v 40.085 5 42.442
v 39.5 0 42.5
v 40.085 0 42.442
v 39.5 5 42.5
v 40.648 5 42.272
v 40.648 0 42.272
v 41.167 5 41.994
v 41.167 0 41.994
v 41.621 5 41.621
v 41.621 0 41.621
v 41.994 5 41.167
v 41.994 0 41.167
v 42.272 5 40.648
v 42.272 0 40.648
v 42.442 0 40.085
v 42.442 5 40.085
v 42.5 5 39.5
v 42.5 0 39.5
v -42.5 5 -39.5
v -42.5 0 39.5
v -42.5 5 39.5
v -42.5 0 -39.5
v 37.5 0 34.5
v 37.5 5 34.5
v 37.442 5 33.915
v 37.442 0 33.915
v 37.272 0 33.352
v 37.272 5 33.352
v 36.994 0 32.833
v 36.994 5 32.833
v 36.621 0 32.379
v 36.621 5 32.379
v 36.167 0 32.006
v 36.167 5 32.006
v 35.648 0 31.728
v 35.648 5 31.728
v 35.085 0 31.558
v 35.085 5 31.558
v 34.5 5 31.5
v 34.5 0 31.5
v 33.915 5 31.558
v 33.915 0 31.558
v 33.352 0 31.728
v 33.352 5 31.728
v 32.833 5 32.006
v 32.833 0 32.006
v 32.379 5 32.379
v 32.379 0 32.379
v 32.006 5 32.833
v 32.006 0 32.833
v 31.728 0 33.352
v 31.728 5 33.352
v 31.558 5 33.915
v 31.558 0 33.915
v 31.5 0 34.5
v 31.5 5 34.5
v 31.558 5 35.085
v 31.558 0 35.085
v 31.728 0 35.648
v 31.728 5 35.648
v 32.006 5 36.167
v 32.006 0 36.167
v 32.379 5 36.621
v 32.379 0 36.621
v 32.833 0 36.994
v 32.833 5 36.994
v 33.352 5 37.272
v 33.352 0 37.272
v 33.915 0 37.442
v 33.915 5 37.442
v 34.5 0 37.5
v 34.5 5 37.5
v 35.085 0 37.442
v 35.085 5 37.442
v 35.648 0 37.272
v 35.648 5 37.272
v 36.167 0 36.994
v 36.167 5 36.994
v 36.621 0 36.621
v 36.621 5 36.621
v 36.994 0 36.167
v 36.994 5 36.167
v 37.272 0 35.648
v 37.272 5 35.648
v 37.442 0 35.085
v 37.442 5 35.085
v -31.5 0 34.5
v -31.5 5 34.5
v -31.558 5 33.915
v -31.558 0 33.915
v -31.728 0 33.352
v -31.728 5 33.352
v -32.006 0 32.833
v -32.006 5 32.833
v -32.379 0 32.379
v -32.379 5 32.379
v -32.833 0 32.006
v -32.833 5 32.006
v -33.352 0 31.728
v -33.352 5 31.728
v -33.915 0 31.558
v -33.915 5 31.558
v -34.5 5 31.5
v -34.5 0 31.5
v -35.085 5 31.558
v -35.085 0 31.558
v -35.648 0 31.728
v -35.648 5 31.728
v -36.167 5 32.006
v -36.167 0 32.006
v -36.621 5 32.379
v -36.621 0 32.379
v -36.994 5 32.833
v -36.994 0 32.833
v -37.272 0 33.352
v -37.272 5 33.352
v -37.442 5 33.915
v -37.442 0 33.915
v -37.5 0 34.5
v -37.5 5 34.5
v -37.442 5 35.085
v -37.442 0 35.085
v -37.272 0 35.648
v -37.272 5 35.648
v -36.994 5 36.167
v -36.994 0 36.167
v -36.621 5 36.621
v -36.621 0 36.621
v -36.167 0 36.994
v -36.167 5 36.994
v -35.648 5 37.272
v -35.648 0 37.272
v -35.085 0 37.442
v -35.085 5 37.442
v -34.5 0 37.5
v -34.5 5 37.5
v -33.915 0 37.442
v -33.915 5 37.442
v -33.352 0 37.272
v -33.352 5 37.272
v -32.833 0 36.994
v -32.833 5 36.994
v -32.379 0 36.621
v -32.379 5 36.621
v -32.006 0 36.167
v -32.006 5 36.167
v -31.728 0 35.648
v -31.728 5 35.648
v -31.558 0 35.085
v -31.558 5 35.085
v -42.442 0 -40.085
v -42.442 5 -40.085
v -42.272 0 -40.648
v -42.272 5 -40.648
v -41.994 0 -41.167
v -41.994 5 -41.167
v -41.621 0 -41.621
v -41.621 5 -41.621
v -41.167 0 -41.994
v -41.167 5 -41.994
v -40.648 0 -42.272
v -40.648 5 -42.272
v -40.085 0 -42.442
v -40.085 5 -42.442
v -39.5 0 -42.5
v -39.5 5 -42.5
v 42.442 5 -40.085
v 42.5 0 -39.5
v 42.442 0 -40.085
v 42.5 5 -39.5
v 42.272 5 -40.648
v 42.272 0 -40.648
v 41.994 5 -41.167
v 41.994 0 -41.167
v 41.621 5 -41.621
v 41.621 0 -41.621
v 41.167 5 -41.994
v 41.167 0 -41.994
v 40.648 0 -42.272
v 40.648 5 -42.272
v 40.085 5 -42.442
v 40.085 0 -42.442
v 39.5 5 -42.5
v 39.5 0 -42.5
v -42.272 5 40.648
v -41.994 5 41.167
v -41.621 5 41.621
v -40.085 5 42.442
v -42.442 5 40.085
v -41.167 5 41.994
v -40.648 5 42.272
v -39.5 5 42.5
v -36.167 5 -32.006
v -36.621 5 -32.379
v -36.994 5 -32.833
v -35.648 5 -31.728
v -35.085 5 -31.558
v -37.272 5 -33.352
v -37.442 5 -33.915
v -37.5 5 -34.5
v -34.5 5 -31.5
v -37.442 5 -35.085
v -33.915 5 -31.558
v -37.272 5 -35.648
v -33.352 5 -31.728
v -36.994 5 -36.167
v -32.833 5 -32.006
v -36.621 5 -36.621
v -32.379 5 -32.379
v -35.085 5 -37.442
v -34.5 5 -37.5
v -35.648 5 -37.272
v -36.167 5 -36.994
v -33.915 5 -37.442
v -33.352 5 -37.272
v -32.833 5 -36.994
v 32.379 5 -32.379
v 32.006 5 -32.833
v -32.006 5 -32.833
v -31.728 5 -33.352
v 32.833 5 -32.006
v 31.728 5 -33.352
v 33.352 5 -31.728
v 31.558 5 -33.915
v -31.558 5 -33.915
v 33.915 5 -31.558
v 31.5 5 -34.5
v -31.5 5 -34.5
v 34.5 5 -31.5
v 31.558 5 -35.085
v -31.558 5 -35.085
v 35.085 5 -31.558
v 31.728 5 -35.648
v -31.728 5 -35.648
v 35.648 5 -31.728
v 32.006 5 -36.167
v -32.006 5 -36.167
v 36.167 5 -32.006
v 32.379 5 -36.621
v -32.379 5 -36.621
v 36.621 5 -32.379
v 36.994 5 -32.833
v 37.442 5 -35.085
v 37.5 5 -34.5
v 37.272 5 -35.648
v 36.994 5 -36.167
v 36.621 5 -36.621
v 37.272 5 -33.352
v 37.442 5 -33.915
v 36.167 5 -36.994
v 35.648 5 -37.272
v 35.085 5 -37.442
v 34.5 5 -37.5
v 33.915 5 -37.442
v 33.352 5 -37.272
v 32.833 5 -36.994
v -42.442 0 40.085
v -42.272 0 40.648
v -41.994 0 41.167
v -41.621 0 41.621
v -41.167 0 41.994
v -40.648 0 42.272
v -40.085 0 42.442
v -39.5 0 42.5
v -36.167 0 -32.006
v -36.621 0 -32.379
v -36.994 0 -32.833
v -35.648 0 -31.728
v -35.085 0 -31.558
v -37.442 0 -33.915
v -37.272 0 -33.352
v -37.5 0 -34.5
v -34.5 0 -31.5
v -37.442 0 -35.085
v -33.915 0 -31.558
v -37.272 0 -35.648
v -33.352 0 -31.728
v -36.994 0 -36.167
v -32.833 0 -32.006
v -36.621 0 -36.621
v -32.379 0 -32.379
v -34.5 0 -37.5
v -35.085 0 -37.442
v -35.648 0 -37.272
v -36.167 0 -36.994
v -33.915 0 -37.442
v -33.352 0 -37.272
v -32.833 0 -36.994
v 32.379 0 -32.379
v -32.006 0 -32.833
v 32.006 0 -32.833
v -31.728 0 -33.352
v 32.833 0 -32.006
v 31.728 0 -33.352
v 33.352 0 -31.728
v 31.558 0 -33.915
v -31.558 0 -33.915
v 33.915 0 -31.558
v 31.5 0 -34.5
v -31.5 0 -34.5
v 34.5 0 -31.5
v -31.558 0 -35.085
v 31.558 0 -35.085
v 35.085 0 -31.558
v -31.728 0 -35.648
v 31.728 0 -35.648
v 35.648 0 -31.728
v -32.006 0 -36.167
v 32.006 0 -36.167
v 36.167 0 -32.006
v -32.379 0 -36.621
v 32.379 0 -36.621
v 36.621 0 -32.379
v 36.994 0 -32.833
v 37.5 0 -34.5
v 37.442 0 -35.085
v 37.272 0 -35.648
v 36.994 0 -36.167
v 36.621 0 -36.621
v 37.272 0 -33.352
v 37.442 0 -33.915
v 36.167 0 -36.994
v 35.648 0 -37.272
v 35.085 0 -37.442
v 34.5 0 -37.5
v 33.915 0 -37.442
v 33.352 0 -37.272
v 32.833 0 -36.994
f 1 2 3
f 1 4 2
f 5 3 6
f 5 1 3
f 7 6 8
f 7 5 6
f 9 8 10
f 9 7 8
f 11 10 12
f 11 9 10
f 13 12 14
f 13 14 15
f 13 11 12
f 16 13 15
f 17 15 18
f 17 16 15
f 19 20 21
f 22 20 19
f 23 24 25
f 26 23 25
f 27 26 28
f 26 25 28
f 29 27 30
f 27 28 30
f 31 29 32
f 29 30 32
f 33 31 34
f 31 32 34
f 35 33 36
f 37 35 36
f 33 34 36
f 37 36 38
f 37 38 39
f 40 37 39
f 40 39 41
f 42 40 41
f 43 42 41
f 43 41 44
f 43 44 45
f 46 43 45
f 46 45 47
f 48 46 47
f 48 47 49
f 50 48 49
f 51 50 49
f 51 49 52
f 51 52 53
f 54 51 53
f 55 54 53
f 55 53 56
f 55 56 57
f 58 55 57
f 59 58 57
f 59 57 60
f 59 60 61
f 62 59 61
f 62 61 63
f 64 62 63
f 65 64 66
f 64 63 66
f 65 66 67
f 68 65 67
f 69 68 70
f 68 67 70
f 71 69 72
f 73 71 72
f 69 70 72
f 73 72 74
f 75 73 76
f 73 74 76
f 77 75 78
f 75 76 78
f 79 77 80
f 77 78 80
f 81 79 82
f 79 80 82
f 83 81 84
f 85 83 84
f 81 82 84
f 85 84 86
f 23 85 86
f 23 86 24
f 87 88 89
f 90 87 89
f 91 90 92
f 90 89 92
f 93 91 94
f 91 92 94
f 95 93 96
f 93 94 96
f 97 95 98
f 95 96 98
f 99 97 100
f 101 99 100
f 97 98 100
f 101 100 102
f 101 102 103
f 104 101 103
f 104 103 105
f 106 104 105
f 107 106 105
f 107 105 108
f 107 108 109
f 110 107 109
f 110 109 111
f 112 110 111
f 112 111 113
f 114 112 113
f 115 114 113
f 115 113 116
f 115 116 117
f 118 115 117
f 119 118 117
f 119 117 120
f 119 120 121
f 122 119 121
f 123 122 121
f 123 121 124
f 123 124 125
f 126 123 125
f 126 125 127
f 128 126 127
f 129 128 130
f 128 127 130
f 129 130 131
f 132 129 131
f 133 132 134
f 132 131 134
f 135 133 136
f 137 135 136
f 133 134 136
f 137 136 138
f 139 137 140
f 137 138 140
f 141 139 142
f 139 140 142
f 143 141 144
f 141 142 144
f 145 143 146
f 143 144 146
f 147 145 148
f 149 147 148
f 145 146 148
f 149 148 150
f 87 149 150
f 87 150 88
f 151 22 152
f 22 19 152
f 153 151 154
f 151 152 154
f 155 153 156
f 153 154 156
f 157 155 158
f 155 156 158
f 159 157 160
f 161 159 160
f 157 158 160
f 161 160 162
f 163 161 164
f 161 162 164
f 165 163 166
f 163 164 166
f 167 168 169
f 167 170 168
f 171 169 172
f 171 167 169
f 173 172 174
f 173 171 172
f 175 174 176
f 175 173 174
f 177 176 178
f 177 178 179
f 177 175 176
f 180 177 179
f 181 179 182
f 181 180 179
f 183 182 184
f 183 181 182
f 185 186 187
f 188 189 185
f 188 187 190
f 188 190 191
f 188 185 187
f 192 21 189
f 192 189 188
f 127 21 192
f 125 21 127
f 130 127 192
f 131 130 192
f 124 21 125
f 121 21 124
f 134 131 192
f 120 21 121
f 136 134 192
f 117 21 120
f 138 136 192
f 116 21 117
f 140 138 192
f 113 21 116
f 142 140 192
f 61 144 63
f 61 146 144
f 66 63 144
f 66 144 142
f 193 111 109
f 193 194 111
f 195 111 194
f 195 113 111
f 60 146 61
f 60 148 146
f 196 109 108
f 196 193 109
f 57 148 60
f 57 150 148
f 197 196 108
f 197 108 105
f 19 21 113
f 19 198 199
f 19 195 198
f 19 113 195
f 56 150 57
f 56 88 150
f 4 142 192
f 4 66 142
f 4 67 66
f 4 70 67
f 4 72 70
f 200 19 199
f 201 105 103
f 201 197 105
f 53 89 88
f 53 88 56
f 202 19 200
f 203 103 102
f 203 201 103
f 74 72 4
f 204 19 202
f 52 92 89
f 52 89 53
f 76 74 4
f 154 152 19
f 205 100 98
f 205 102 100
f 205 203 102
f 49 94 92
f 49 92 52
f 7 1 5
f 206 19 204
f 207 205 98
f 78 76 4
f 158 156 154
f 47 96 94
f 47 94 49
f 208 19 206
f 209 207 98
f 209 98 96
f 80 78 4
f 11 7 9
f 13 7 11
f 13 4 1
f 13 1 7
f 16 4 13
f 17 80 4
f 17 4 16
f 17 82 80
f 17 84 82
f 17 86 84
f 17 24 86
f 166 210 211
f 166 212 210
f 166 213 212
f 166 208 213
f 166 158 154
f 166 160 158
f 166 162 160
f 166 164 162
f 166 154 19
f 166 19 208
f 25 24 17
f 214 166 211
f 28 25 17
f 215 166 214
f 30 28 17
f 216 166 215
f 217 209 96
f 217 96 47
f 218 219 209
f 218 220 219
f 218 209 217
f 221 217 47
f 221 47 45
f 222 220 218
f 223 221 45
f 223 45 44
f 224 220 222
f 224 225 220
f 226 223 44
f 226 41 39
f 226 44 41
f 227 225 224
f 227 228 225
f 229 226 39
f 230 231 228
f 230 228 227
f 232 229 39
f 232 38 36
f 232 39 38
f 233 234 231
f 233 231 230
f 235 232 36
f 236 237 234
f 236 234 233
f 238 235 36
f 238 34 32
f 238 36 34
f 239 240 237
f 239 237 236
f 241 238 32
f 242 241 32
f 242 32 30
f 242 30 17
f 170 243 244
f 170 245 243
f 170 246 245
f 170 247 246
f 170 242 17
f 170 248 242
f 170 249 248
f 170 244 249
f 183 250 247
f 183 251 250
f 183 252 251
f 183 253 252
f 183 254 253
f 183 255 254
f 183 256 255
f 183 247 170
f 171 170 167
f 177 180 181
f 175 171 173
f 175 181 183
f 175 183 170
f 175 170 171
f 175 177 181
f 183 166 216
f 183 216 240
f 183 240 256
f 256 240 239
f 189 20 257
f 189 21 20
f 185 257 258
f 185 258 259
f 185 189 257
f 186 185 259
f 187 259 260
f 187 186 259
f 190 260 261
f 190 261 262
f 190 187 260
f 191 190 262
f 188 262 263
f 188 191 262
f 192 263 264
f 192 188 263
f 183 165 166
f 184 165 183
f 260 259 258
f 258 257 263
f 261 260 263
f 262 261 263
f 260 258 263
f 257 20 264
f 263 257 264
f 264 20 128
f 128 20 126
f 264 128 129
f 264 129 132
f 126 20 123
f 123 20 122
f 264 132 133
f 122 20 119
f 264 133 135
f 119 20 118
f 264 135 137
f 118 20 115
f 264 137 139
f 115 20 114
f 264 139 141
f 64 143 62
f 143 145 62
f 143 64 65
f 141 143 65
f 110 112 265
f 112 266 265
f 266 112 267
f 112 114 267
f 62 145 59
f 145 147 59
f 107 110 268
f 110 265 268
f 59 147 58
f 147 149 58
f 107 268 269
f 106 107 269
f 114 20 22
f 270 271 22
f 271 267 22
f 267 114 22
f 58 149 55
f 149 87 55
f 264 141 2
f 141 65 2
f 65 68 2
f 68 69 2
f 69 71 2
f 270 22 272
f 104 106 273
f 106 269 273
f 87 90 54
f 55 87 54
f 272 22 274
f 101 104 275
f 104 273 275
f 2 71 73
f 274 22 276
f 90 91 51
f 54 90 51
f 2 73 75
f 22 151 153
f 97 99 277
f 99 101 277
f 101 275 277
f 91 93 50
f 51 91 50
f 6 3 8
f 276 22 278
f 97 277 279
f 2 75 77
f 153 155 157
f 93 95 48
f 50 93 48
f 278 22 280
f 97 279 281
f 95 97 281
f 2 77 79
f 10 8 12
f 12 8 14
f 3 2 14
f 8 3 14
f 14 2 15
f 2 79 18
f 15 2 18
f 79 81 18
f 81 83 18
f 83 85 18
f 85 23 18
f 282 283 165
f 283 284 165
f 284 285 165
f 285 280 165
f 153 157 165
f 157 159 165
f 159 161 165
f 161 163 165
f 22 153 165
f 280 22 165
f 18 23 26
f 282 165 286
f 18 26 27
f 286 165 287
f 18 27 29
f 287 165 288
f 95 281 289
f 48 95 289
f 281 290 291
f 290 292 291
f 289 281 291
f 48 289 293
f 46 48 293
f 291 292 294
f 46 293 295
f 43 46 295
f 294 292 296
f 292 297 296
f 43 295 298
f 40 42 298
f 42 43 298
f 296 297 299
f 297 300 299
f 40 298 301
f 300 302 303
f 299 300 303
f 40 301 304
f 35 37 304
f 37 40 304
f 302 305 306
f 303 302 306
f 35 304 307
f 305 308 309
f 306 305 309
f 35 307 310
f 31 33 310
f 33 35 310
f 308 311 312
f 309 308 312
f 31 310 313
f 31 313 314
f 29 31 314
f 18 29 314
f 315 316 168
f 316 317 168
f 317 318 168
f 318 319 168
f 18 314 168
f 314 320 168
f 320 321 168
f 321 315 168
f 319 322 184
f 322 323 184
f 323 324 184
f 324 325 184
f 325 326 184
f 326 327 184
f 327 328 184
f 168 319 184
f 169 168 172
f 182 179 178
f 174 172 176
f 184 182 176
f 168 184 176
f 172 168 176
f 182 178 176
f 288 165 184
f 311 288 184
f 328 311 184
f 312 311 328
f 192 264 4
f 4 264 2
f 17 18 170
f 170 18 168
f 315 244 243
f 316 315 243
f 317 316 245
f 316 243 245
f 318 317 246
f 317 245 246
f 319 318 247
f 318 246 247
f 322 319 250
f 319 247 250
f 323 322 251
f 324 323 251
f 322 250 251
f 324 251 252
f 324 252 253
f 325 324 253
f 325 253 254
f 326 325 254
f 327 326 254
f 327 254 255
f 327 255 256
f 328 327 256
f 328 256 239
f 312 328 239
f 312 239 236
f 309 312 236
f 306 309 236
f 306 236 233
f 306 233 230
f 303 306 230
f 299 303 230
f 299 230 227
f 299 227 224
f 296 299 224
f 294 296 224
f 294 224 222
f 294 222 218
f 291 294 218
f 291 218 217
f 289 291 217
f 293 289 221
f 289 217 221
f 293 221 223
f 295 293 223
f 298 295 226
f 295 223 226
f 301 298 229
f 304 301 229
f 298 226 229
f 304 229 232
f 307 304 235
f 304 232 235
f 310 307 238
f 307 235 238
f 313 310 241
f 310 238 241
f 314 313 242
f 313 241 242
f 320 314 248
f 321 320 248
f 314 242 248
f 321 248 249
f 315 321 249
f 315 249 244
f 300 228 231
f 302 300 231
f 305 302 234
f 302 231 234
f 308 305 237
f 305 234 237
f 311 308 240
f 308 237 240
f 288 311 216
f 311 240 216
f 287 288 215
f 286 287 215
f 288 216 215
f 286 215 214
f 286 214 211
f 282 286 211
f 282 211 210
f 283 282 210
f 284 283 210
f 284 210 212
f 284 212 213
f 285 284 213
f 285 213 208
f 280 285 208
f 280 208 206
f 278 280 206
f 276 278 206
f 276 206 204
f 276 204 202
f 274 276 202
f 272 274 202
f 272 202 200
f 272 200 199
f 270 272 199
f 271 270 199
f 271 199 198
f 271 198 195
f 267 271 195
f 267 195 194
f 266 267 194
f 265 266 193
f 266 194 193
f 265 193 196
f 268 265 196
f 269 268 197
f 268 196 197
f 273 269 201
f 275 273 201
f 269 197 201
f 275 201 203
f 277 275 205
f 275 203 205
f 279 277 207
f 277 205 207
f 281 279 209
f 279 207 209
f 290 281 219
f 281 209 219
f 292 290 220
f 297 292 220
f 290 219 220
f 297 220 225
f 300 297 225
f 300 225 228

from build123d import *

# Parameters (mm, degrees)
SKETCH1_W           = 85
SKETCH1_H           = 85
BOSS_EXTRUDE1_DEPTH = 5
FILLET1_R           = 3
SKETCH2_R           = 3
CUT_EXTRUDE1_DEPTH  = 6


with BuildPart() as part:
    # Sketch1 → Boss-Extrude1 (new body)
    with BuildSketch(Plane(origin=(0, 0, 0), x_dir=(1, 0, 0), z_dir=(0, 1, 0))):
        Rectangle(SKETCH1_W, SKETCH1_H)
    extrude(amount=BOSS_EXTRUDE1_DEPTH)

    # Fillet1
    fillet1_edges = [part.edges().sort_by_distance(p)[0] for p in [
        (42.5, 2.5, 42.5),
        (-42.5, 2.5, 42.5),
        (-42.5, 2.5, -42.5),
        (42.5, 2.5, -42.5),
    ]]
    fillet(fillet1_edges, radius=FILLET1_R)

    # Sketch2 → Cut-Extrude1 (cut, through all)
    with BuildSketch(Plane(origin=(0, 5, 0), x_dir=(1, 0, 0), z_dir=(0, 1, 0))):
        with Locations((-34.5, 34.5)):
            Circle(SKETCH2_R)
        with Locations((-34.5, -34.5)):
            Circle(SKETCH2_R)
        with Locations((34.5, -34.5)):
            Circle(SKETCH2_R)
        with Locations((34.5, 34.5)):
            Circle(SKETCH2_R)
    extrude(amount=-CUT_EXTRUDE1_DEPTH, mode=Mode.SUBTRACT)


solid = part.part
